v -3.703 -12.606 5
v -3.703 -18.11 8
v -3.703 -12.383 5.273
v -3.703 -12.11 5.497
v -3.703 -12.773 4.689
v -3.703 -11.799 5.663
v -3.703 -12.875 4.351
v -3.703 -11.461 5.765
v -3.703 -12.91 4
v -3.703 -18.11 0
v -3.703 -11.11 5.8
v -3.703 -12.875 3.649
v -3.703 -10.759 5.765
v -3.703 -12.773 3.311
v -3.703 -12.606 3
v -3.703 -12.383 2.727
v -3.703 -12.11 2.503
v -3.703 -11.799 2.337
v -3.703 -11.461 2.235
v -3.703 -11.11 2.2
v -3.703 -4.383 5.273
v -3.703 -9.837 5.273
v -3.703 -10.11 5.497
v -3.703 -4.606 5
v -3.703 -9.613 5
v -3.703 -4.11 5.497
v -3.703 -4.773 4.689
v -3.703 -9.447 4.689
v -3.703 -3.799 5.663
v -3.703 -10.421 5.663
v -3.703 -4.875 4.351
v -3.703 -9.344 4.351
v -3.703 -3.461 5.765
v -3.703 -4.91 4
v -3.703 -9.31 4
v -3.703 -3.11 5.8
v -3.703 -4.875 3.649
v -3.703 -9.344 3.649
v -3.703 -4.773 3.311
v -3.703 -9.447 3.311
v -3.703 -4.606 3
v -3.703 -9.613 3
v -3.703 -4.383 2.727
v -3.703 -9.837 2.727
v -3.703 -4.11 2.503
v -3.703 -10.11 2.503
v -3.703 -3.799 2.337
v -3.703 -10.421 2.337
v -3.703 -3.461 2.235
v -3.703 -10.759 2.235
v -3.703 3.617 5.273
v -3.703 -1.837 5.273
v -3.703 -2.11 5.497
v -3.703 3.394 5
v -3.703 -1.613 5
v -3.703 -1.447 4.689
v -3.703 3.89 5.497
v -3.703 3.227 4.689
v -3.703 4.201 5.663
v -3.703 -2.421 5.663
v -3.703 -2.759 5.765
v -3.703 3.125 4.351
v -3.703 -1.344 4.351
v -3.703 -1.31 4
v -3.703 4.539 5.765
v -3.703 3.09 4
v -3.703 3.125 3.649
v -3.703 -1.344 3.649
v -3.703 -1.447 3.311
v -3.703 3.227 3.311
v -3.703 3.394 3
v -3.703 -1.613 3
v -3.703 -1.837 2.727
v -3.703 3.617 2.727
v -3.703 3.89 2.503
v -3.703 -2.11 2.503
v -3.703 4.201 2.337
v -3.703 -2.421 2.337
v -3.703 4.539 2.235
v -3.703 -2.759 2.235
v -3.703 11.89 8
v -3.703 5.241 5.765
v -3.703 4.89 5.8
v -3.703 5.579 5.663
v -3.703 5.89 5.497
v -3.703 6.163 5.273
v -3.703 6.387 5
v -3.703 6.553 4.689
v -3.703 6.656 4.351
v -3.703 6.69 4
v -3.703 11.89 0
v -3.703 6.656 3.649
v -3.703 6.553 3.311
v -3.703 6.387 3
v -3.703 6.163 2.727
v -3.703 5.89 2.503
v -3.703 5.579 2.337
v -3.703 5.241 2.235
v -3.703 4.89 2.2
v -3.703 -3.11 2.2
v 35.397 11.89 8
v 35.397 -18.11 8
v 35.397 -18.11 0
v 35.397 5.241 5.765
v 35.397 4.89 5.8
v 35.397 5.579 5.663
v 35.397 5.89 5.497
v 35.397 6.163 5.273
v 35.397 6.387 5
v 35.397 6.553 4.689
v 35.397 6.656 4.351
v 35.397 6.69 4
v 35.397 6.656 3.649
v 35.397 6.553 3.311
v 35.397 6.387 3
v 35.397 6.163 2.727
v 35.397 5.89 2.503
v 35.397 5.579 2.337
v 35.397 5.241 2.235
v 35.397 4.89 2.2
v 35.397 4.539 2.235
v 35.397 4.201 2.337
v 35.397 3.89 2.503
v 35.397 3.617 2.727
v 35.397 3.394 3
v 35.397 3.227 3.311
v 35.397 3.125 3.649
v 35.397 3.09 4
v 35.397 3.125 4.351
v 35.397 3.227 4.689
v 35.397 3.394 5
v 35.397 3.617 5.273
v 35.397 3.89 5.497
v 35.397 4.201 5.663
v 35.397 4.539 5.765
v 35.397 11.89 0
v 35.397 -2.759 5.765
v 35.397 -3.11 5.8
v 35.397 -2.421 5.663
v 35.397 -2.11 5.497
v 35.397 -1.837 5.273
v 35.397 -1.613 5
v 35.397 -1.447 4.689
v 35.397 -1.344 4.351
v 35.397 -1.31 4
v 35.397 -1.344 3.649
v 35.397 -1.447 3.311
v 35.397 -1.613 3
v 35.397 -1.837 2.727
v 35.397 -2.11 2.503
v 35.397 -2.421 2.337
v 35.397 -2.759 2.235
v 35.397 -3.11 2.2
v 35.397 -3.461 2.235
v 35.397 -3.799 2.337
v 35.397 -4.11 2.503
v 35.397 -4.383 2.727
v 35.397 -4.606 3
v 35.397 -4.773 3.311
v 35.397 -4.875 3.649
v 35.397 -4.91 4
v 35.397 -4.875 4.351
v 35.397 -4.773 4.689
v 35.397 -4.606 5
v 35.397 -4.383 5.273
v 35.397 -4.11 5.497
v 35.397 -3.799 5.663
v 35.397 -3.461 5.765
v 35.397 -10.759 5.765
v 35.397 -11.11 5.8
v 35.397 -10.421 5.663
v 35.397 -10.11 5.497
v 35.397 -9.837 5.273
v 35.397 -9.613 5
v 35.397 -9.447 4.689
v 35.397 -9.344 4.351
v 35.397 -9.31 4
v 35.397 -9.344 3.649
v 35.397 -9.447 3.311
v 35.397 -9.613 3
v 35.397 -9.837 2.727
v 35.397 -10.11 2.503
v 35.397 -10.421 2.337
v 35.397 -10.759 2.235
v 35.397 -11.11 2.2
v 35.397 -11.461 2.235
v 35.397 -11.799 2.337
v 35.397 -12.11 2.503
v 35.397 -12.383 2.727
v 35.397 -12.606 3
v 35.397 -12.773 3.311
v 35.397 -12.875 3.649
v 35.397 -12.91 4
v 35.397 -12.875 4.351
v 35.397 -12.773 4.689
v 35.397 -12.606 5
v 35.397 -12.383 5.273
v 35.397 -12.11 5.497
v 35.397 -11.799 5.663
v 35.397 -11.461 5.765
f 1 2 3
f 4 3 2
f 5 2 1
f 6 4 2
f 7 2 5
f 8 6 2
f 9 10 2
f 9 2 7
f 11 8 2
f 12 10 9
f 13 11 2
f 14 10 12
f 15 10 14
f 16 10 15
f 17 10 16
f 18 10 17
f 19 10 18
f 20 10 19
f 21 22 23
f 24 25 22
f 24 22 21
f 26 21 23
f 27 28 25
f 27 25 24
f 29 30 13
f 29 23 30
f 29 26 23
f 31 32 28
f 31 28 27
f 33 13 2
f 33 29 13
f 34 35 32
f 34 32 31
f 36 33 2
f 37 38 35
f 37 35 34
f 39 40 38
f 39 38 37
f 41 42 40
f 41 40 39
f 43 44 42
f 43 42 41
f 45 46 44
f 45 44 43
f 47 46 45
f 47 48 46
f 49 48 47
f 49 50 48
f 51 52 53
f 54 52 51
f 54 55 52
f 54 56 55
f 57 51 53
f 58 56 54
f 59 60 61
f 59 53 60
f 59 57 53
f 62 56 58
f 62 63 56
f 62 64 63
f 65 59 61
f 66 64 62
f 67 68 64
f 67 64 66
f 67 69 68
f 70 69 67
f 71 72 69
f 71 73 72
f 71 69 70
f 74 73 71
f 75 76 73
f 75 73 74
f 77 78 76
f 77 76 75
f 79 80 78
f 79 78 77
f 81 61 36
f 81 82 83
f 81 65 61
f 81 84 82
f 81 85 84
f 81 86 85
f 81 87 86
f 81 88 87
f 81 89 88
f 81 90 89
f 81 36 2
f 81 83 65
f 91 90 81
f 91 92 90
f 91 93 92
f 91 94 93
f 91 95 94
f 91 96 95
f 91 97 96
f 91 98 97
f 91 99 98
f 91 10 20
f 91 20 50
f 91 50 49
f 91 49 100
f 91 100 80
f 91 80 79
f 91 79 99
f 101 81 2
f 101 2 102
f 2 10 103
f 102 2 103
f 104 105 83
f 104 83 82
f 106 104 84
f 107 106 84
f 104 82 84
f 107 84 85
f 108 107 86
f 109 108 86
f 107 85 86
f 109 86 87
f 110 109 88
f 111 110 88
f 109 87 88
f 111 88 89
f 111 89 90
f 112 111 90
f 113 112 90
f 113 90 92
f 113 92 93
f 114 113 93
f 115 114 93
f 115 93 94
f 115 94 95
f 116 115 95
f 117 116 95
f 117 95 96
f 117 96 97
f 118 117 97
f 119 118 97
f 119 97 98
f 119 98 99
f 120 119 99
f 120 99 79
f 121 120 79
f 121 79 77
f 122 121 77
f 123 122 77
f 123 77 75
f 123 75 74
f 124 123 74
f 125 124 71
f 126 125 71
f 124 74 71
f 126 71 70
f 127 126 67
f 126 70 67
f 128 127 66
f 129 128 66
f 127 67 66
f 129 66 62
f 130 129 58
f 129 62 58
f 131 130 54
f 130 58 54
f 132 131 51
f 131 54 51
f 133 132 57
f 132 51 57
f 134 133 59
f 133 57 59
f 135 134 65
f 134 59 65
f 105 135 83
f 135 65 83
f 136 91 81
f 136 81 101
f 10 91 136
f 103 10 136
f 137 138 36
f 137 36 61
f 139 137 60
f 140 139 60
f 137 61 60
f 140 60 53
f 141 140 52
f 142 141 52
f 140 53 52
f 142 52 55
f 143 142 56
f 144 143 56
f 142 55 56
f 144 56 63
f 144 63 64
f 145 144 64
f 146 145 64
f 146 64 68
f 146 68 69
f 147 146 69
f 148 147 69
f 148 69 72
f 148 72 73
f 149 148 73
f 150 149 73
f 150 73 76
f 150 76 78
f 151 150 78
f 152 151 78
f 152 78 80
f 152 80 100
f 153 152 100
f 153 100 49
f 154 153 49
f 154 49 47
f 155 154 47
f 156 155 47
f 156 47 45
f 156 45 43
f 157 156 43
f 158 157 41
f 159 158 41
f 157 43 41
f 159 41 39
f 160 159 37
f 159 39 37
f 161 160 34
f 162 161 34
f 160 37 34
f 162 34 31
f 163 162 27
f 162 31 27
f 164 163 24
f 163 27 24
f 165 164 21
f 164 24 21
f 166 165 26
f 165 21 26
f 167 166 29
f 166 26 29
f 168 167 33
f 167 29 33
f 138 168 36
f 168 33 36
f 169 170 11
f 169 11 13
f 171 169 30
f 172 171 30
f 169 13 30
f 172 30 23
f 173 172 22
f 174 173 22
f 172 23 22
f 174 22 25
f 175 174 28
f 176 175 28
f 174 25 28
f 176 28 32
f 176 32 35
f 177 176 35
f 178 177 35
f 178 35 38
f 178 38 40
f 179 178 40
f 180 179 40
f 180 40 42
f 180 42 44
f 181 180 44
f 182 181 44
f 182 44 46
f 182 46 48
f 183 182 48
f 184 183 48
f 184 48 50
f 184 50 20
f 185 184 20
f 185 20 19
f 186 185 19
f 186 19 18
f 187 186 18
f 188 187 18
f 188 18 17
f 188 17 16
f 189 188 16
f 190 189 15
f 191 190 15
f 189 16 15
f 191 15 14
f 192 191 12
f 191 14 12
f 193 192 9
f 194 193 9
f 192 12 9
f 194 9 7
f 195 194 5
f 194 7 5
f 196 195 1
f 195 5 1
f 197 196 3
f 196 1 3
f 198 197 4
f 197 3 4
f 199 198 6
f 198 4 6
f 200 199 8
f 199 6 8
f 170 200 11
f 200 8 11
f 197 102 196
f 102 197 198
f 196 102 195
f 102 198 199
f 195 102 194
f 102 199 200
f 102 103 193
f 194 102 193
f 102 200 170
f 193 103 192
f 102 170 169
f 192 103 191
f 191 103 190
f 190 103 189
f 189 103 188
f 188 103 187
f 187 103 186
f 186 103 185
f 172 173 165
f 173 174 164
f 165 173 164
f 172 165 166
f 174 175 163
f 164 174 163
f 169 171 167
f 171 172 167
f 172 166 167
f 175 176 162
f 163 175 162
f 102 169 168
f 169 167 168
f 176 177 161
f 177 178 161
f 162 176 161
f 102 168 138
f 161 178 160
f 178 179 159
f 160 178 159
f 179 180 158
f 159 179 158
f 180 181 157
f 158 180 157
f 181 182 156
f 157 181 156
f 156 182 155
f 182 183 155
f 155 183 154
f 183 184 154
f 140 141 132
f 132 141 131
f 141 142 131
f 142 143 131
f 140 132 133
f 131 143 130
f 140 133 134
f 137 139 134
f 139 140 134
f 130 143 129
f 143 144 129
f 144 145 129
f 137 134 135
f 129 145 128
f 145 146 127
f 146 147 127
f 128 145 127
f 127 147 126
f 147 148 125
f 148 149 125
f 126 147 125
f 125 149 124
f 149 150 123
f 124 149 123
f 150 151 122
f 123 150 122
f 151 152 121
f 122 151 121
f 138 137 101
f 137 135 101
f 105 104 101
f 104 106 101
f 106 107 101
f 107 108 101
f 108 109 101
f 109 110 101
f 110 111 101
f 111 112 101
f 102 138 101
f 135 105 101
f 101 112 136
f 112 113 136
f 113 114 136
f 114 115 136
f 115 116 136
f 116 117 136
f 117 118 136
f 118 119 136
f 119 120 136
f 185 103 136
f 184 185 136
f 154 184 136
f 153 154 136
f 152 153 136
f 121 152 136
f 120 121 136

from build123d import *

# Parameters (mm, degrees)
SKETCH_1_W          = 39.1
SKETCH_1_H          = 30
EXTRUDE_1_DEPTH     = 8
SKETCH_2_R          = 1.8
CUT_EXTRUDE_1_DEPTH = 44.826627362


with BuildPart() as part:
    # 草圖1 → 填料-伸長1 (new body)
    with BuildSketch(Plane.XY):
        with Locations((15.847455636, -3.109756098)):
            Rectangle(SKETCH_1_W, SKETCH_1_H)
    extrude(amount=EXTRUDE_1_DEPTH)

    # 草圖2 → 除料-伸長1 (cut, through all)
    with BuildSketch(Plane.ZY.offset(3.702544364)):
        with Locations((4, 4.890243902)):
            Circle(SKETCH_2_R)
        with Locations((4, -3.109756098)):
            Circle(SKETCH_2_R)
        with Locations((4, -11.109756098)):
            Circle(SKETCH_2_R)
    extrude(amount=-CUT_EXTRUDE_1_DEPTH, mode=Mode.SUBTRACT)


solid = part.part
